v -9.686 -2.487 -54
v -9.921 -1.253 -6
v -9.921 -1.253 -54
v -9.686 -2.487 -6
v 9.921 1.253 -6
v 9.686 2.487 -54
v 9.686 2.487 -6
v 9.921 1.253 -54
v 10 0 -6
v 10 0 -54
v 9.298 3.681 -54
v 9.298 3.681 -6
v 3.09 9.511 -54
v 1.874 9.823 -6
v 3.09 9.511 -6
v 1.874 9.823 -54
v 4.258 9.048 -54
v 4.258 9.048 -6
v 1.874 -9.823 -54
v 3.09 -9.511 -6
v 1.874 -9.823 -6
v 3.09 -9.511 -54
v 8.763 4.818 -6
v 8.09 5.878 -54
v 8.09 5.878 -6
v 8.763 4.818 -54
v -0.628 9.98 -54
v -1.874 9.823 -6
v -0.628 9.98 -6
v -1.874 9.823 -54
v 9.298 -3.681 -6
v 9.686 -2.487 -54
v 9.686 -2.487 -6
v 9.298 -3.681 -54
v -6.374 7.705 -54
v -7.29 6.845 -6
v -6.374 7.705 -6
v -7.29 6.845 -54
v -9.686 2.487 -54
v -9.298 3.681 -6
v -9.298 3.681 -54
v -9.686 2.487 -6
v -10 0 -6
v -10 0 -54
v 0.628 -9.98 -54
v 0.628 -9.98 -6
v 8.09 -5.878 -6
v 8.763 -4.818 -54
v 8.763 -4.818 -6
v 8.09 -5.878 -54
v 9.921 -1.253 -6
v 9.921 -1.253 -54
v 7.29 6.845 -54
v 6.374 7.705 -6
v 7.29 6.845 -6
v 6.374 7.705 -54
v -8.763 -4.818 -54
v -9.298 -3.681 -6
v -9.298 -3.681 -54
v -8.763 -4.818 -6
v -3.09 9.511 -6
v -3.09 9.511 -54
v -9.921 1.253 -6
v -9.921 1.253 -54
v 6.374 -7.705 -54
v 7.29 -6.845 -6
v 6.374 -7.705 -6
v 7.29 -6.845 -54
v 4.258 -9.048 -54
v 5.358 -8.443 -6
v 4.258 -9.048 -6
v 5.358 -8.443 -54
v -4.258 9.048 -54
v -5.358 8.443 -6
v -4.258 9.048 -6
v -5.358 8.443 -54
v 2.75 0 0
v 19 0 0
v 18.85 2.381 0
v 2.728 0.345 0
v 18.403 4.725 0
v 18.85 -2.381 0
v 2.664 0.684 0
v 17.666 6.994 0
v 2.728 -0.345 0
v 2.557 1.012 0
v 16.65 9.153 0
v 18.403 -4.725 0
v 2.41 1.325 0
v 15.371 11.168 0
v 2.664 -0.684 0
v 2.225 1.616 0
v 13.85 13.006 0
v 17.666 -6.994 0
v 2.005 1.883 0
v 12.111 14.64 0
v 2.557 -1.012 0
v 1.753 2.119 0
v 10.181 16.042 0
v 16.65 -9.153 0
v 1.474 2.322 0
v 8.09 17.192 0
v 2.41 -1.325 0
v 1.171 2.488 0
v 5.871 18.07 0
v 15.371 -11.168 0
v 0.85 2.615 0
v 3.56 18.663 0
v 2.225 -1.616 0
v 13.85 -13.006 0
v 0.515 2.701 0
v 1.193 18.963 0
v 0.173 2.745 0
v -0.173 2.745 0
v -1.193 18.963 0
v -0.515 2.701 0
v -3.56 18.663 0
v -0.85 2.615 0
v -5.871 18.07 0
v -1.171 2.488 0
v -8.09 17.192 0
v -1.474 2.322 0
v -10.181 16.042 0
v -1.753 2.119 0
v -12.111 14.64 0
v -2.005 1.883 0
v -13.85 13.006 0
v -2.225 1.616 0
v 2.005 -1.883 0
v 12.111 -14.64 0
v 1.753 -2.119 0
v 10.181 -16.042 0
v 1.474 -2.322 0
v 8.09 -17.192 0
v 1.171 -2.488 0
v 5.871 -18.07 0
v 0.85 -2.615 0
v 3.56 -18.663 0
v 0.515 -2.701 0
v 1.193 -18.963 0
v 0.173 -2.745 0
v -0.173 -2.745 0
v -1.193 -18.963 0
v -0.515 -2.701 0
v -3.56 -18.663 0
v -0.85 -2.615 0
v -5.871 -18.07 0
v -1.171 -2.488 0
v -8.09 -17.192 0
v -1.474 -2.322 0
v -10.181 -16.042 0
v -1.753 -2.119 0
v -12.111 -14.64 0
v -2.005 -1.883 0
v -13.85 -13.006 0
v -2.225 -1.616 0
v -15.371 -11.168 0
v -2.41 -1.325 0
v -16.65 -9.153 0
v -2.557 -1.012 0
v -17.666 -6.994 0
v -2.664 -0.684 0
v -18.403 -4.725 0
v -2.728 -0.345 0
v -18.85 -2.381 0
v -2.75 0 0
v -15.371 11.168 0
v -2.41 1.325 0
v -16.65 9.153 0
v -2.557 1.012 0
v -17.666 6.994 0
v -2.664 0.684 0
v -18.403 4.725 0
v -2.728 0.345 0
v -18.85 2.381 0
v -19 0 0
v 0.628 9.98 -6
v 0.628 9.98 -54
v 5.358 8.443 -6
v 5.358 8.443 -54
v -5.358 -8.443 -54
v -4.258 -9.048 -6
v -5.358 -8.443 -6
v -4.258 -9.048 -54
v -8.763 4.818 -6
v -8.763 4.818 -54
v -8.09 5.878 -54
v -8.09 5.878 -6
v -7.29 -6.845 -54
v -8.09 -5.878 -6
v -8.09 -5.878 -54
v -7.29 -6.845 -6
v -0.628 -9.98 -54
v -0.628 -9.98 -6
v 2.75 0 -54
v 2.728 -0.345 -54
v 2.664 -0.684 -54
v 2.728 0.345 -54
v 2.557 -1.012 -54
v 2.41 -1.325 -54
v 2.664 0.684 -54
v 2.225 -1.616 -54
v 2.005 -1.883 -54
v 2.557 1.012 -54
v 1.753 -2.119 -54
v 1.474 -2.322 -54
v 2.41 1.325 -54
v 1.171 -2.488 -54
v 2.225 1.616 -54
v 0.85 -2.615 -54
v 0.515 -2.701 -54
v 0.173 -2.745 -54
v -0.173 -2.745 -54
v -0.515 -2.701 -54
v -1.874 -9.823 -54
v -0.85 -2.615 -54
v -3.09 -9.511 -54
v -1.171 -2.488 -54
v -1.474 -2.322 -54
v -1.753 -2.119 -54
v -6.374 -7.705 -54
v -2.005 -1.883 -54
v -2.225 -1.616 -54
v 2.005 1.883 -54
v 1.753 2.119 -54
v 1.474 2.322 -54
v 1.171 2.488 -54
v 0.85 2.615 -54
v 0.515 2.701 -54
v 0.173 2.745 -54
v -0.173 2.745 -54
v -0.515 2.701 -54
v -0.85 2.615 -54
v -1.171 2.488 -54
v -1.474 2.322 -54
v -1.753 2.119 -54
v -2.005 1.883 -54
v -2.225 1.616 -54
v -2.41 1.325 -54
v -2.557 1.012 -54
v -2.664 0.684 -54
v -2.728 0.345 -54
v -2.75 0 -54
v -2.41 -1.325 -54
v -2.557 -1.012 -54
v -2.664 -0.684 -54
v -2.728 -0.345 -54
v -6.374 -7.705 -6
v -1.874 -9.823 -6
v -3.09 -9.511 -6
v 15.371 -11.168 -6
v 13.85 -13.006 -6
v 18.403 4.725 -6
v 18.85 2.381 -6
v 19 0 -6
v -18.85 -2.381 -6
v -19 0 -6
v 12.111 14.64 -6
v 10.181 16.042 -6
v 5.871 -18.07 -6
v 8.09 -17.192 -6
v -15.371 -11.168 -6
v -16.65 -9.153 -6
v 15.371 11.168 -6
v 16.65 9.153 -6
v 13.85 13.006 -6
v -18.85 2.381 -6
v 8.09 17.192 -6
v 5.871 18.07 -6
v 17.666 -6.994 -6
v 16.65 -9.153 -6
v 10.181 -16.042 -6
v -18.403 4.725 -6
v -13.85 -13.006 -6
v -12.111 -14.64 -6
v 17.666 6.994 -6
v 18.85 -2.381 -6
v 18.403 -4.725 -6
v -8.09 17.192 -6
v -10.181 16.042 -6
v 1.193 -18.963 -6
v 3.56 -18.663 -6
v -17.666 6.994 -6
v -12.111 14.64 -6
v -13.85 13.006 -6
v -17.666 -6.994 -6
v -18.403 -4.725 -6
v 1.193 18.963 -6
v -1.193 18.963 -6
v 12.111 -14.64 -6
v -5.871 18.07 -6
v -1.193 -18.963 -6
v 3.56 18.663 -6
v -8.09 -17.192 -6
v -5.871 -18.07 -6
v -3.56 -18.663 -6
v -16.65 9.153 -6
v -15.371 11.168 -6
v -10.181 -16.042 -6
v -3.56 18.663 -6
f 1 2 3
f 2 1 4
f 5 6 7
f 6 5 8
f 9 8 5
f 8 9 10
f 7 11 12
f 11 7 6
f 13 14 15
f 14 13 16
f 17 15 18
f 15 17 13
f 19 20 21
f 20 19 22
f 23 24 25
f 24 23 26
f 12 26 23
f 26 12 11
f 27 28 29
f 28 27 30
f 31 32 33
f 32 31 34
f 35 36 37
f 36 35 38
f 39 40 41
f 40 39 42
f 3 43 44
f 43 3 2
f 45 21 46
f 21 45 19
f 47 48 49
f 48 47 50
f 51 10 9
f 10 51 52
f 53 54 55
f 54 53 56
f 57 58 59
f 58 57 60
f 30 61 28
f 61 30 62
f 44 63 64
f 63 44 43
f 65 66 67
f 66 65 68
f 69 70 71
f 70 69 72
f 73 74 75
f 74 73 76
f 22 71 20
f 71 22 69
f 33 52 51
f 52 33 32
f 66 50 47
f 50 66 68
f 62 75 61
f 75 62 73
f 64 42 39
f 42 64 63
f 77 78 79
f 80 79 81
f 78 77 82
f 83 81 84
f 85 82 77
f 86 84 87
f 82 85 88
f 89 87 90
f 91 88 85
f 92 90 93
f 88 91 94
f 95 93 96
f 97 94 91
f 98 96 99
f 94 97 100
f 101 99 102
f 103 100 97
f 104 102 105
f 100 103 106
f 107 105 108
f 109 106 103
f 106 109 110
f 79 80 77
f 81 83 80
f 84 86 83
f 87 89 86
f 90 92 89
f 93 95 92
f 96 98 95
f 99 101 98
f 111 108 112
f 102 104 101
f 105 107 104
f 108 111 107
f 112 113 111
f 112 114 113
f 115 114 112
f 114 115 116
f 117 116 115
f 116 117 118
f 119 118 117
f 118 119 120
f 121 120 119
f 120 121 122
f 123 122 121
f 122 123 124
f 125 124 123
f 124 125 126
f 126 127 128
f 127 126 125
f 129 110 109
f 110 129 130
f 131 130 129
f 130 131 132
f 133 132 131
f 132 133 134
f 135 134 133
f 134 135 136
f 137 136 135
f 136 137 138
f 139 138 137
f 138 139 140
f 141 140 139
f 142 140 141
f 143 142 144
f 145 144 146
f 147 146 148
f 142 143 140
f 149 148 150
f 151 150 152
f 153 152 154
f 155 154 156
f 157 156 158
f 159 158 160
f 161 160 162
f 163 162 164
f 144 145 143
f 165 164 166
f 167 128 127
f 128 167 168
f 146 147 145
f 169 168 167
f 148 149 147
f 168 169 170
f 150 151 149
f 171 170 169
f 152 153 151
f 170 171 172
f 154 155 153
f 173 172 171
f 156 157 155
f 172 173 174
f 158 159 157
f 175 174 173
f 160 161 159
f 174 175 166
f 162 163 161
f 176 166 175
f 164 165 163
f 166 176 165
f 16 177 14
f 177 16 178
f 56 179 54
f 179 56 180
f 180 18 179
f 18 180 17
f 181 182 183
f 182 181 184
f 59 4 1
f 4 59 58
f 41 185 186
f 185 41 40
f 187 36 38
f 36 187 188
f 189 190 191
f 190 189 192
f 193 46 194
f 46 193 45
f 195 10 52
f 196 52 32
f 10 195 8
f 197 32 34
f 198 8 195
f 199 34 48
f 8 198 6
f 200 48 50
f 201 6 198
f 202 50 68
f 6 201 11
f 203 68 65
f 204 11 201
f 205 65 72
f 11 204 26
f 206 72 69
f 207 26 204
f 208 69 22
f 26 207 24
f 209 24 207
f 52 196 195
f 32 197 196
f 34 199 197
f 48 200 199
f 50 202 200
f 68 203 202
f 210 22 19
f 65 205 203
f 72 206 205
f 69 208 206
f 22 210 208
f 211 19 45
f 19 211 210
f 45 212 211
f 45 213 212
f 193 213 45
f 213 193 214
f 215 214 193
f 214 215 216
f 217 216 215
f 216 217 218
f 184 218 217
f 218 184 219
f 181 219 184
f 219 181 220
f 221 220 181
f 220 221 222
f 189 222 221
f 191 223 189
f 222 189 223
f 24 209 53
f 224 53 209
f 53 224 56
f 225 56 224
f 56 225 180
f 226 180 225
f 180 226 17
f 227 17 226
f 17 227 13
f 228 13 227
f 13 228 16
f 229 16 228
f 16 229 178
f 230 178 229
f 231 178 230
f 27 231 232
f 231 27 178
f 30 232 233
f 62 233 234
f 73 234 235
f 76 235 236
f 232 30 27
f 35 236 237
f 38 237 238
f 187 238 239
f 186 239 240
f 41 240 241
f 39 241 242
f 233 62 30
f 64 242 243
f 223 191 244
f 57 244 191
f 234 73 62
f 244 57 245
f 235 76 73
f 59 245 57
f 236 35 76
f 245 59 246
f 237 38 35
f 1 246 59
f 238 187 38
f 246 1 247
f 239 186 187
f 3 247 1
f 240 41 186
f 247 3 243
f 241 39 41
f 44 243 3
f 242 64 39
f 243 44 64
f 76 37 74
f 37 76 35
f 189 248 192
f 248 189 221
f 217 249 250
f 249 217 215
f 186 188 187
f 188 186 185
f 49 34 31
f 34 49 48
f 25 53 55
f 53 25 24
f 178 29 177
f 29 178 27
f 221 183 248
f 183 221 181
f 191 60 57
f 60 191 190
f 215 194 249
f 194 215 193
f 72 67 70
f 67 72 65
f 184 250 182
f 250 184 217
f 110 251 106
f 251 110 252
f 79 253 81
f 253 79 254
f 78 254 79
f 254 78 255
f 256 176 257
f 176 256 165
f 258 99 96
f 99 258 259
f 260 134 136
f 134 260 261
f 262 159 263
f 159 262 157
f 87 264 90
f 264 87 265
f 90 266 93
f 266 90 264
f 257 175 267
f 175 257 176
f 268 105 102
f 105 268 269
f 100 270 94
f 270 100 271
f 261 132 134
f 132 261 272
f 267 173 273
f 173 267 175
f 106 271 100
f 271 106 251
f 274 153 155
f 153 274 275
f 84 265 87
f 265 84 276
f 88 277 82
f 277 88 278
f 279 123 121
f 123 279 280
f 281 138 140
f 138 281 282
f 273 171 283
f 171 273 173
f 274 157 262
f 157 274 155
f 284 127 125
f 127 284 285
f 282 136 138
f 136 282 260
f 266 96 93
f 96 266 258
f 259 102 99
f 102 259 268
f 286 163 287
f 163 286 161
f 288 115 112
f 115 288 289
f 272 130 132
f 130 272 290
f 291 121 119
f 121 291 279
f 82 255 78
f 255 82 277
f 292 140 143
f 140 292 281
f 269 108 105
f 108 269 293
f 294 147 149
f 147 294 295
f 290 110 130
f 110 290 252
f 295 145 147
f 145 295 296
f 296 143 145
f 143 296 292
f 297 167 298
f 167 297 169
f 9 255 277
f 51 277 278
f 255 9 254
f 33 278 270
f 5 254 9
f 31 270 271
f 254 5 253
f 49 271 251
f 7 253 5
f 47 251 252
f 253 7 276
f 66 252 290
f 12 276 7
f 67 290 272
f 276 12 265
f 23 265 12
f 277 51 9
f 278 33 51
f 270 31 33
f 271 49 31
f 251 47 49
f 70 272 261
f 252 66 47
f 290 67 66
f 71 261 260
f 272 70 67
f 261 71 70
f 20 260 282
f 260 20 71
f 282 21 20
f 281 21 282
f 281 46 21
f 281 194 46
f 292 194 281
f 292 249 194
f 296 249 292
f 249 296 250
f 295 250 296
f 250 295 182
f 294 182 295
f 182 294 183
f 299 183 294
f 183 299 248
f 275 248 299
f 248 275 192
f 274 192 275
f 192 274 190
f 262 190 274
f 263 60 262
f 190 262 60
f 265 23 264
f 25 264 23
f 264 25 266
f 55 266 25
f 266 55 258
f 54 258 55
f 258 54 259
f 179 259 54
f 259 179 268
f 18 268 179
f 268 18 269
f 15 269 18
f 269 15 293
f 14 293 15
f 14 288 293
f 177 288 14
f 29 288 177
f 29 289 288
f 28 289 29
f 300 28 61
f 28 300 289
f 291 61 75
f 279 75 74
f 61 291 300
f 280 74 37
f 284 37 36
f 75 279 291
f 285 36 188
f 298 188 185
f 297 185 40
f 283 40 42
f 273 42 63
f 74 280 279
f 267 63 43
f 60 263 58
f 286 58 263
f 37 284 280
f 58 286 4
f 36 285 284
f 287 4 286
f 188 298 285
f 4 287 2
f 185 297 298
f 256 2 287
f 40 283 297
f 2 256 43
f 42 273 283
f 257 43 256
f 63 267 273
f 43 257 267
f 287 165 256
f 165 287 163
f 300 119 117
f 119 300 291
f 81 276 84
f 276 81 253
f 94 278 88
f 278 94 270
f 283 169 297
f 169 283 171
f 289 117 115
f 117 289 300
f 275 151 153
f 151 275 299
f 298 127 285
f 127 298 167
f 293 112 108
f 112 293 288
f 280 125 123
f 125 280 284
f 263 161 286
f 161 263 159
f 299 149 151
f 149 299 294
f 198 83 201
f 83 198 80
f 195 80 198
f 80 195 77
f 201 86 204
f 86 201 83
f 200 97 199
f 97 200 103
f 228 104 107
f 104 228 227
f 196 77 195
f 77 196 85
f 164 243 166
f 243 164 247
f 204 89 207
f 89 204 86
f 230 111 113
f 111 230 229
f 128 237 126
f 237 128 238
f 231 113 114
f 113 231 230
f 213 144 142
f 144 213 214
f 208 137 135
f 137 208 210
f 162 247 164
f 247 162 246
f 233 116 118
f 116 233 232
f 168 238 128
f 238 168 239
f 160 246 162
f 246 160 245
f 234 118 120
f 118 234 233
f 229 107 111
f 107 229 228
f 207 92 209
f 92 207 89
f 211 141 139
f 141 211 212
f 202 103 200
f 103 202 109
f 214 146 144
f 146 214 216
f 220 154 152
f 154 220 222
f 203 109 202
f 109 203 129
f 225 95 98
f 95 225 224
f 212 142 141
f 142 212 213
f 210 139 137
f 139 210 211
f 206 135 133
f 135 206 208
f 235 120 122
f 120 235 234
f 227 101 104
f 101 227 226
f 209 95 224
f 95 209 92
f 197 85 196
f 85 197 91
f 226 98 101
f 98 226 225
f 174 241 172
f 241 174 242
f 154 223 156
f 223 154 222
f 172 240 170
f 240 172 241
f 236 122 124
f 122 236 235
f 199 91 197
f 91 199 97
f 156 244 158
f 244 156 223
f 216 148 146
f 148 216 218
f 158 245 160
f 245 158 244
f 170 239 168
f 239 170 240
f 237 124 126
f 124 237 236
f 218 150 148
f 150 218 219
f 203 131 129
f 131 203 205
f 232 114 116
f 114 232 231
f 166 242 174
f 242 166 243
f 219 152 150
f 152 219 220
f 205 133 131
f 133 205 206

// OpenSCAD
$fn = 50;


difference() {
	union() {
		translate(v = [0, 0, -54.0000000000]) {
			cylinder(h = 54, r = 10.0000000000);
		}
		translate(v = [0, 0, -6.0000000000]) {
			cylinder(h = 6, r = 19.0000000000);
		}
	}
	union() {
		#translate(v = [0, 0, -54]) {
			cylinder(h = 54, r = 2.7500000000);
		}
	}
}
